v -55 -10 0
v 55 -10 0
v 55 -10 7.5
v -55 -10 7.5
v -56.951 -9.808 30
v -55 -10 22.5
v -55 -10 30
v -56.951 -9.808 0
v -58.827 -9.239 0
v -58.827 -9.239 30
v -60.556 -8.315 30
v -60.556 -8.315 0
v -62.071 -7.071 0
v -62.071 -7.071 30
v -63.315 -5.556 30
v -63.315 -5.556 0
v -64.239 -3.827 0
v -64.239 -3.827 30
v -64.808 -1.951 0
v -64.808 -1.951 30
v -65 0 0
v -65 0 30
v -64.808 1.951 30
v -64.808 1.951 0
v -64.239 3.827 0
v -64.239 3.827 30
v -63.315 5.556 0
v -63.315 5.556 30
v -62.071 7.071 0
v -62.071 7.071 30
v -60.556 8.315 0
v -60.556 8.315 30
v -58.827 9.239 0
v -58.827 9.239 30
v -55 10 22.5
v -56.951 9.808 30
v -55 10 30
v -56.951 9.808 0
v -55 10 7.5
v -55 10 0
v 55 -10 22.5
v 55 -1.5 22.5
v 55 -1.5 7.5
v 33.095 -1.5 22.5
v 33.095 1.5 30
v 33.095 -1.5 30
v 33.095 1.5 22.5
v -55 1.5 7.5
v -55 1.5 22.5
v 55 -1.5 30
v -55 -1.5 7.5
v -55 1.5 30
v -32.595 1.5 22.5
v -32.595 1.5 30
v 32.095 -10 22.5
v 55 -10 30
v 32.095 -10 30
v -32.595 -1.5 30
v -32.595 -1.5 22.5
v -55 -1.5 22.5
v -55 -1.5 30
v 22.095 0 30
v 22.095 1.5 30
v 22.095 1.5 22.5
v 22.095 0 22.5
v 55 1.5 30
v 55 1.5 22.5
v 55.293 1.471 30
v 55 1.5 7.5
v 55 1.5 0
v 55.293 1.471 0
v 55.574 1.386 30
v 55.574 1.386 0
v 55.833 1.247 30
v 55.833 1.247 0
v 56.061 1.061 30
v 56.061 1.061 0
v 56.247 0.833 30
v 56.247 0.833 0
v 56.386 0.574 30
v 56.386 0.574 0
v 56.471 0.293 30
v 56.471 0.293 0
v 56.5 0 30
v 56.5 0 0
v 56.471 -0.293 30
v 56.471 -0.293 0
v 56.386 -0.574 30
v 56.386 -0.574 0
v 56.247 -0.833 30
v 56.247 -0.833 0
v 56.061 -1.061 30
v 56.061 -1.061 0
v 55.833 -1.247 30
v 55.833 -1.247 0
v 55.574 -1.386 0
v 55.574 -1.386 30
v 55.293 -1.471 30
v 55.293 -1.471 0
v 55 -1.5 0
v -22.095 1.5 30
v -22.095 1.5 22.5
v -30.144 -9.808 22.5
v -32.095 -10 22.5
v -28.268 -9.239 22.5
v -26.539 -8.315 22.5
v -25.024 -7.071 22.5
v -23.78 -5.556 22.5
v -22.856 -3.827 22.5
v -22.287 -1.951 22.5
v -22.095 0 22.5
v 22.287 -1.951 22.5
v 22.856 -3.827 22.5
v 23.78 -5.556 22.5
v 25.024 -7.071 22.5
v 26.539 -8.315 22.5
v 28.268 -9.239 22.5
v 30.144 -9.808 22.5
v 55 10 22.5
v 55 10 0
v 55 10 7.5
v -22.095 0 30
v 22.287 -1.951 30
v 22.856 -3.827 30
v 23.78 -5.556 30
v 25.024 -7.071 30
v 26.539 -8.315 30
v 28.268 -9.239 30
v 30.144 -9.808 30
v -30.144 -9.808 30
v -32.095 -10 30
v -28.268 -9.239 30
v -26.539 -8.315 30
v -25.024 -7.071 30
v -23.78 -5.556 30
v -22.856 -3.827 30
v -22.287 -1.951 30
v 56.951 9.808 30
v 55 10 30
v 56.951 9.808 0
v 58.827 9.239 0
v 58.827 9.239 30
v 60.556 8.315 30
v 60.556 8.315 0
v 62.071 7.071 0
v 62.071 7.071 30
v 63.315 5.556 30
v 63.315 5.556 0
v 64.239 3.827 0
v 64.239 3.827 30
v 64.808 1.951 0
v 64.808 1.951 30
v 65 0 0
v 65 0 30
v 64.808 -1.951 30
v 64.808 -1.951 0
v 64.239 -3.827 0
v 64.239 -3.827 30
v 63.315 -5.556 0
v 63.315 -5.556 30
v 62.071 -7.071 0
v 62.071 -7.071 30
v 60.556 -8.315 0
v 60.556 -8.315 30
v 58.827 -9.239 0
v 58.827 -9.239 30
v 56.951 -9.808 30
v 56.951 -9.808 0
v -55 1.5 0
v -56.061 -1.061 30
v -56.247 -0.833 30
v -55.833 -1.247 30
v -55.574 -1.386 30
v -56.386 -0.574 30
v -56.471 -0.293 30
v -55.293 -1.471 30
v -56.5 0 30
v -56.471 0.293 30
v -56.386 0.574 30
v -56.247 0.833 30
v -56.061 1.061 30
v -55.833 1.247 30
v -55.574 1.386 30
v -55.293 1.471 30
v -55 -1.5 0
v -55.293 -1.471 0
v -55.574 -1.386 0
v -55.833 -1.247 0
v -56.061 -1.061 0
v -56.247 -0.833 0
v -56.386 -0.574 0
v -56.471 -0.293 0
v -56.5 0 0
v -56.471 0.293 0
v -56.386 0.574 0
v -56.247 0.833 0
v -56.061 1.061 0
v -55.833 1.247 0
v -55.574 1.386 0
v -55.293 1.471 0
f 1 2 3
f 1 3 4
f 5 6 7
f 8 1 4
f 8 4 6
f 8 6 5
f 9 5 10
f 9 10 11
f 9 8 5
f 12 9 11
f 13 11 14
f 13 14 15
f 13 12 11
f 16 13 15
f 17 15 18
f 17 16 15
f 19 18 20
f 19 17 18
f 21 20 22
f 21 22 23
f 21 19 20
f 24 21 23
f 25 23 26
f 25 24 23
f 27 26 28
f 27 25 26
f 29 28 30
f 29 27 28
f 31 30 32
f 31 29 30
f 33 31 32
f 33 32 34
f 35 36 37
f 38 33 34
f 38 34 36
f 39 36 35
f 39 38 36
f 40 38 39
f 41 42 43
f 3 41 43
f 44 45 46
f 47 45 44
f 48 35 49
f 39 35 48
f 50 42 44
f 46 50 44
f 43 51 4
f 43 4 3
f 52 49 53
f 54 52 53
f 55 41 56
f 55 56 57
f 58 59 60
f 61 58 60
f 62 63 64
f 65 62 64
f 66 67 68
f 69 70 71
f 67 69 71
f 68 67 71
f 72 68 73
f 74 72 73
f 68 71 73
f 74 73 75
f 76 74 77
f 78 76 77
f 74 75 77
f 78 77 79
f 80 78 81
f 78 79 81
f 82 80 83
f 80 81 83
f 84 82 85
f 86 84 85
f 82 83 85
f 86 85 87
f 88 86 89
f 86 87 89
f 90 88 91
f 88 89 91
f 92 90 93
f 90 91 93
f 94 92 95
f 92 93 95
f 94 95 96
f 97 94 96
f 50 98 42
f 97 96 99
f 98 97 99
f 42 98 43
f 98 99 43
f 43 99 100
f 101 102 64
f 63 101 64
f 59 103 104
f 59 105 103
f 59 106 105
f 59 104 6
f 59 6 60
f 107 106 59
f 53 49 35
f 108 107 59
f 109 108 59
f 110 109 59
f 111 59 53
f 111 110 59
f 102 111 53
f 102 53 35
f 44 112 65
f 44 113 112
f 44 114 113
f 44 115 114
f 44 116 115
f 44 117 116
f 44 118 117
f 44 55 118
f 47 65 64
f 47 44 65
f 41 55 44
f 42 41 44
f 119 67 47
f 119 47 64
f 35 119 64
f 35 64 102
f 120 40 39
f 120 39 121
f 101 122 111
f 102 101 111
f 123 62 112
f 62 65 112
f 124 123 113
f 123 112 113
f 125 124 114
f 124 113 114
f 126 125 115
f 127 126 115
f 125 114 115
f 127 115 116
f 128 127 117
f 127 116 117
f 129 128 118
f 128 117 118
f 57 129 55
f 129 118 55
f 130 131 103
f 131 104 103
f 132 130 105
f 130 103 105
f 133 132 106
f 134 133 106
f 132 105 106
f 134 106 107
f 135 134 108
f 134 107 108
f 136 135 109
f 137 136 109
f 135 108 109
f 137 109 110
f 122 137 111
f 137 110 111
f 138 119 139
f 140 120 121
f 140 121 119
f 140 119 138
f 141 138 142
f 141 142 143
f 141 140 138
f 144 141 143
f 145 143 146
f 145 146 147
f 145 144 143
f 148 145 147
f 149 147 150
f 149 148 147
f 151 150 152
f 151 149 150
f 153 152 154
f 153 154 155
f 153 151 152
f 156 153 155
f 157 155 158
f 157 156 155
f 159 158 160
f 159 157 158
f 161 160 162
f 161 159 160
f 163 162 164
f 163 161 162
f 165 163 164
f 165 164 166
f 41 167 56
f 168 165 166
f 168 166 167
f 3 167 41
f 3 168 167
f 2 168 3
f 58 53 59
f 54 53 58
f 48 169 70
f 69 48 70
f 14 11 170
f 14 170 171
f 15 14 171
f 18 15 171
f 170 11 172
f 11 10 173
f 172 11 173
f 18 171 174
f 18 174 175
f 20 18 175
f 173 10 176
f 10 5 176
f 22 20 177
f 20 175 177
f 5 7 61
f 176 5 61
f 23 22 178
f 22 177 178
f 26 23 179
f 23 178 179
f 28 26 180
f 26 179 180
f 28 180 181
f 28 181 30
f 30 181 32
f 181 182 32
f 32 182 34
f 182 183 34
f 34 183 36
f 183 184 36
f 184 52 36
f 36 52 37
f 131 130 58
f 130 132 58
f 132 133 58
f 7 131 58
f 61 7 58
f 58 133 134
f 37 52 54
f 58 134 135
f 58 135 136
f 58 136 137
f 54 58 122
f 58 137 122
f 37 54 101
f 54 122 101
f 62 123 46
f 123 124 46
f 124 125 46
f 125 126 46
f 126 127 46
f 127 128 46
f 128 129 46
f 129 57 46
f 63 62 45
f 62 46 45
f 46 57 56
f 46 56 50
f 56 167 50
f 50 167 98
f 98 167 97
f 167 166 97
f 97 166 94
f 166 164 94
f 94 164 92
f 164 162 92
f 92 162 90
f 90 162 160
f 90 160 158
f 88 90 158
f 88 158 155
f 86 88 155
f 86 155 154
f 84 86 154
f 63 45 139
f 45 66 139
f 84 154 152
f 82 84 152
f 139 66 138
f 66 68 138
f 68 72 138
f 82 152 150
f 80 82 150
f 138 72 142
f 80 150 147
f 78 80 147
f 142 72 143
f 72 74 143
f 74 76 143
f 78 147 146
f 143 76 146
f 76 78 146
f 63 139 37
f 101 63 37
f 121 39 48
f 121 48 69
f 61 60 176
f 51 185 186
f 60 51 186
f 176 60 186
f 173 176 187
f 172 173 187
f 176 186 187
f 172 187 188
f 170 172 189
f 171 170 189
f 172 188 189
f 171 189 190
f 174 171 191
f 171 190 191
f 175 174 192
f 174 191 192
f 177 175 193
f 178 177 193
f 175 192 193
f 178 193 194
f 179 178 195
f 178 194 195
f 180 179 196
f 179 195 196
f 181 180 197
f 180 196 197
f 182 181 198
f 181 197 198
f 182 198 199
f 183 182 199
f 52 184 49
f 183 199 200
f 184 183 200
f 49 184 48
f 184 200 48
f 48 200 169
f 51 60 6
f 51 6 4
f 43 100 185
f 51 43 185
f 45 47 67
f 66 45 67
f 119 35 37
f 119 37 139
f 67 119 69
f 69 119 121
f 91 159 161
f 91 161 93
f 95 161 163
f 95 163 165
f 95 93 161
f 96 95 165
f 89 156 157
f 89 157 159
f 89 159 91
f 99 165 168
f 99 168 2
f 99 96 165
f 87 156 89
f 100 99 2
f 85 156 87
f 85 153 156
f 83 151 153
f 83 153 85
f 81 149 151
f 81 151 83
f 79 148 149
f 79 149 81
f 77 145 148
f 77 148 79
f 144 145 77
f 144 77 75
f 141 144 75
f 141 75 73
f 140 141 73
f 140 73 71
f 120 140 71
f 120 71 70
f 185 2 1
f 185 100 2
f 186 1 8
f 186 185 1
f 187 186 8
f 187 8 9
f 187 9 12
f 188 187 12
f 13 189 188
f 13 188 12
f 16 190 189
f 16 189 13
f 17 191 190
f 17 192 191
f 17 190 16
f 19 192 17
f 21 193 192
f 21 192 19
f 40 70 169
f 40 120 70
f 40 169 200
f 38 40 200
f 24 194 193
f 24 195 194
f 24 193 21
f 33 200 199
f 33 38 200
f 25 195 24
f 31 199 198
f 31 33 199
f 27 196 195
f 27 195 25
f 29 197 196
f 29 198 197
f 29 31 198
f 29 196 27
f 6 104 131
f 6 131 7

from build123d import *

# Parameters (mm, degrees)
BOSS_EXTRU_1_DEPTH      = 30
ESQUISSE2_W             = 110
ESQUISSE2_H             = 15
ENL_V_MAT_EXTRU_1_DEPTH = 30
ENL_V_START             = -10
ESQUISSE3_W             = 44.19
ESQUISSE3_H             = 7.5
ENL_V_MAT_EXTRU_2_DEPTH = 10
ESQUISSE4_W             = 5
ESQUISSE4_H             = 7.5
BOSS_EXTRU_2_DEPTH      = 10
ESQUISSE5_W             = 7.5
ESQUISSE5_H             = 3
BOSS_EXTRU_3_DEPTH      = 6
ESQUISSE6_W             = 7.5
ESQUISSE6_H             = 3
BOSS_EXTRU_4_DEPTH      = 5.5
CONG_1_R                = 10


with BuildPart() as part:
    # Esquisse1 → Boss.-Extru.1 (new body)
    with BuildSketch(Plane.XY):
        with BuildLine():
            Line((-55, 10), (55, 10))
            ThreePointArc((55, 10), (65, 0), (55, -10))
            Line((55, -10), (-55, -10))
            ThreePointArc((-55, -10), (-65, 0), (-55, 10))
        make_face()
        with BuildLine():
            Line((-55, 1.5), (55, 1.5))
            ThreePointArc((55, 1.5), (56.5, 0), (55, -1.5))
            Line((55, -1.5), (-55, -1.5))
            ThreePointArc((-55, -1.5), (-56.5, 0), (-55, 1.5))
        make_face(mode=Mode.SUBTRACT)
    extrude(amount=BOSS_EXTRU_1_DEPTH)

    # Esquisse2 → Enlèv. mat.-Extru.1 (cut)
    with BuildSketch(Plane(origin=(0, 10, 0), x_dir=(1, 0, 0), z_dir=(0, 1, 0))):
        with Locations((0, -15)):
            Rectangle(ESQUISSE2_W, ESQUISSE2_H)
    extrude(amount=-ENL_V_MAT_EXTRU_1_DEPTH, mode=Mode.SUBTRACT)

    # Esquisse3 → Enlèv. mat.-Extru.2 (cut)
    with BuildSketch(Plane(origin=(0, 10, 0), x_dir=(1, 0, 0), z_dir=(0, 1, 0)).offset(ENL_V_START)):
        with Locations((0, -26.25)):
            Rectangle(ESQUISSE3_W, ESQUISSE3_H)
    extrude(amount=-ENL_V_MAT_EXTRU_2_DEPTH, mode=Mode.SUBTRACT)

    # Esquisse4 → Boss.-Extru.2 (add)
    with BuildSketch(Plane(origin=(0, -1.5, 0), x_dir=(1, 0, 0), z_dir=(0, 1, 0))):
        with Locations((-24.595, -26.25)):
            Rectangle(ESQUISSE4_W, ESQUISSE4_H)
        with Locations((24.595, -26.25)):
            Rectangle(ESQUISSE4_W, ESQUISSE4_H)
    extrude(amount=BOSS_EXTRU_2_DEPTH)

    # Esquisse5 → Boss.-Extru.3 (add)
    with BuildSketch(Plane(origin=(27.095, 0, 0), x_dir=(0, 0, -1), z_dir=(1, 0, 0))):
        with Locations((-26.25, 0)):
            Rectangle(ESQUISSE5_W, ESQUISSE5_H)
    extrude(amount=BOSS_EXTRU_3_DEPTH)

    # Esquisse6 → Boss.-Extru.4 (add)
    with BuildSketch(Plane.ZY.offset(27.095)):
        with Locations((26.25, 0)):
            Rectangle(ESQUISSE6_W, ESQUISSE6_H)
    extrude(amount=BOSS_EXTRU_4_DEPTH)

    # Congé1
    cong_1_edges = [part.edges().sort_by_distance(p)[0] for p in [
        (22.095, -10, 26.25),
        (-22.095, -10, 26.25),
    ]]
    fillet(cong_1_edges, radius=CONG_1_R)


solid = part.part
